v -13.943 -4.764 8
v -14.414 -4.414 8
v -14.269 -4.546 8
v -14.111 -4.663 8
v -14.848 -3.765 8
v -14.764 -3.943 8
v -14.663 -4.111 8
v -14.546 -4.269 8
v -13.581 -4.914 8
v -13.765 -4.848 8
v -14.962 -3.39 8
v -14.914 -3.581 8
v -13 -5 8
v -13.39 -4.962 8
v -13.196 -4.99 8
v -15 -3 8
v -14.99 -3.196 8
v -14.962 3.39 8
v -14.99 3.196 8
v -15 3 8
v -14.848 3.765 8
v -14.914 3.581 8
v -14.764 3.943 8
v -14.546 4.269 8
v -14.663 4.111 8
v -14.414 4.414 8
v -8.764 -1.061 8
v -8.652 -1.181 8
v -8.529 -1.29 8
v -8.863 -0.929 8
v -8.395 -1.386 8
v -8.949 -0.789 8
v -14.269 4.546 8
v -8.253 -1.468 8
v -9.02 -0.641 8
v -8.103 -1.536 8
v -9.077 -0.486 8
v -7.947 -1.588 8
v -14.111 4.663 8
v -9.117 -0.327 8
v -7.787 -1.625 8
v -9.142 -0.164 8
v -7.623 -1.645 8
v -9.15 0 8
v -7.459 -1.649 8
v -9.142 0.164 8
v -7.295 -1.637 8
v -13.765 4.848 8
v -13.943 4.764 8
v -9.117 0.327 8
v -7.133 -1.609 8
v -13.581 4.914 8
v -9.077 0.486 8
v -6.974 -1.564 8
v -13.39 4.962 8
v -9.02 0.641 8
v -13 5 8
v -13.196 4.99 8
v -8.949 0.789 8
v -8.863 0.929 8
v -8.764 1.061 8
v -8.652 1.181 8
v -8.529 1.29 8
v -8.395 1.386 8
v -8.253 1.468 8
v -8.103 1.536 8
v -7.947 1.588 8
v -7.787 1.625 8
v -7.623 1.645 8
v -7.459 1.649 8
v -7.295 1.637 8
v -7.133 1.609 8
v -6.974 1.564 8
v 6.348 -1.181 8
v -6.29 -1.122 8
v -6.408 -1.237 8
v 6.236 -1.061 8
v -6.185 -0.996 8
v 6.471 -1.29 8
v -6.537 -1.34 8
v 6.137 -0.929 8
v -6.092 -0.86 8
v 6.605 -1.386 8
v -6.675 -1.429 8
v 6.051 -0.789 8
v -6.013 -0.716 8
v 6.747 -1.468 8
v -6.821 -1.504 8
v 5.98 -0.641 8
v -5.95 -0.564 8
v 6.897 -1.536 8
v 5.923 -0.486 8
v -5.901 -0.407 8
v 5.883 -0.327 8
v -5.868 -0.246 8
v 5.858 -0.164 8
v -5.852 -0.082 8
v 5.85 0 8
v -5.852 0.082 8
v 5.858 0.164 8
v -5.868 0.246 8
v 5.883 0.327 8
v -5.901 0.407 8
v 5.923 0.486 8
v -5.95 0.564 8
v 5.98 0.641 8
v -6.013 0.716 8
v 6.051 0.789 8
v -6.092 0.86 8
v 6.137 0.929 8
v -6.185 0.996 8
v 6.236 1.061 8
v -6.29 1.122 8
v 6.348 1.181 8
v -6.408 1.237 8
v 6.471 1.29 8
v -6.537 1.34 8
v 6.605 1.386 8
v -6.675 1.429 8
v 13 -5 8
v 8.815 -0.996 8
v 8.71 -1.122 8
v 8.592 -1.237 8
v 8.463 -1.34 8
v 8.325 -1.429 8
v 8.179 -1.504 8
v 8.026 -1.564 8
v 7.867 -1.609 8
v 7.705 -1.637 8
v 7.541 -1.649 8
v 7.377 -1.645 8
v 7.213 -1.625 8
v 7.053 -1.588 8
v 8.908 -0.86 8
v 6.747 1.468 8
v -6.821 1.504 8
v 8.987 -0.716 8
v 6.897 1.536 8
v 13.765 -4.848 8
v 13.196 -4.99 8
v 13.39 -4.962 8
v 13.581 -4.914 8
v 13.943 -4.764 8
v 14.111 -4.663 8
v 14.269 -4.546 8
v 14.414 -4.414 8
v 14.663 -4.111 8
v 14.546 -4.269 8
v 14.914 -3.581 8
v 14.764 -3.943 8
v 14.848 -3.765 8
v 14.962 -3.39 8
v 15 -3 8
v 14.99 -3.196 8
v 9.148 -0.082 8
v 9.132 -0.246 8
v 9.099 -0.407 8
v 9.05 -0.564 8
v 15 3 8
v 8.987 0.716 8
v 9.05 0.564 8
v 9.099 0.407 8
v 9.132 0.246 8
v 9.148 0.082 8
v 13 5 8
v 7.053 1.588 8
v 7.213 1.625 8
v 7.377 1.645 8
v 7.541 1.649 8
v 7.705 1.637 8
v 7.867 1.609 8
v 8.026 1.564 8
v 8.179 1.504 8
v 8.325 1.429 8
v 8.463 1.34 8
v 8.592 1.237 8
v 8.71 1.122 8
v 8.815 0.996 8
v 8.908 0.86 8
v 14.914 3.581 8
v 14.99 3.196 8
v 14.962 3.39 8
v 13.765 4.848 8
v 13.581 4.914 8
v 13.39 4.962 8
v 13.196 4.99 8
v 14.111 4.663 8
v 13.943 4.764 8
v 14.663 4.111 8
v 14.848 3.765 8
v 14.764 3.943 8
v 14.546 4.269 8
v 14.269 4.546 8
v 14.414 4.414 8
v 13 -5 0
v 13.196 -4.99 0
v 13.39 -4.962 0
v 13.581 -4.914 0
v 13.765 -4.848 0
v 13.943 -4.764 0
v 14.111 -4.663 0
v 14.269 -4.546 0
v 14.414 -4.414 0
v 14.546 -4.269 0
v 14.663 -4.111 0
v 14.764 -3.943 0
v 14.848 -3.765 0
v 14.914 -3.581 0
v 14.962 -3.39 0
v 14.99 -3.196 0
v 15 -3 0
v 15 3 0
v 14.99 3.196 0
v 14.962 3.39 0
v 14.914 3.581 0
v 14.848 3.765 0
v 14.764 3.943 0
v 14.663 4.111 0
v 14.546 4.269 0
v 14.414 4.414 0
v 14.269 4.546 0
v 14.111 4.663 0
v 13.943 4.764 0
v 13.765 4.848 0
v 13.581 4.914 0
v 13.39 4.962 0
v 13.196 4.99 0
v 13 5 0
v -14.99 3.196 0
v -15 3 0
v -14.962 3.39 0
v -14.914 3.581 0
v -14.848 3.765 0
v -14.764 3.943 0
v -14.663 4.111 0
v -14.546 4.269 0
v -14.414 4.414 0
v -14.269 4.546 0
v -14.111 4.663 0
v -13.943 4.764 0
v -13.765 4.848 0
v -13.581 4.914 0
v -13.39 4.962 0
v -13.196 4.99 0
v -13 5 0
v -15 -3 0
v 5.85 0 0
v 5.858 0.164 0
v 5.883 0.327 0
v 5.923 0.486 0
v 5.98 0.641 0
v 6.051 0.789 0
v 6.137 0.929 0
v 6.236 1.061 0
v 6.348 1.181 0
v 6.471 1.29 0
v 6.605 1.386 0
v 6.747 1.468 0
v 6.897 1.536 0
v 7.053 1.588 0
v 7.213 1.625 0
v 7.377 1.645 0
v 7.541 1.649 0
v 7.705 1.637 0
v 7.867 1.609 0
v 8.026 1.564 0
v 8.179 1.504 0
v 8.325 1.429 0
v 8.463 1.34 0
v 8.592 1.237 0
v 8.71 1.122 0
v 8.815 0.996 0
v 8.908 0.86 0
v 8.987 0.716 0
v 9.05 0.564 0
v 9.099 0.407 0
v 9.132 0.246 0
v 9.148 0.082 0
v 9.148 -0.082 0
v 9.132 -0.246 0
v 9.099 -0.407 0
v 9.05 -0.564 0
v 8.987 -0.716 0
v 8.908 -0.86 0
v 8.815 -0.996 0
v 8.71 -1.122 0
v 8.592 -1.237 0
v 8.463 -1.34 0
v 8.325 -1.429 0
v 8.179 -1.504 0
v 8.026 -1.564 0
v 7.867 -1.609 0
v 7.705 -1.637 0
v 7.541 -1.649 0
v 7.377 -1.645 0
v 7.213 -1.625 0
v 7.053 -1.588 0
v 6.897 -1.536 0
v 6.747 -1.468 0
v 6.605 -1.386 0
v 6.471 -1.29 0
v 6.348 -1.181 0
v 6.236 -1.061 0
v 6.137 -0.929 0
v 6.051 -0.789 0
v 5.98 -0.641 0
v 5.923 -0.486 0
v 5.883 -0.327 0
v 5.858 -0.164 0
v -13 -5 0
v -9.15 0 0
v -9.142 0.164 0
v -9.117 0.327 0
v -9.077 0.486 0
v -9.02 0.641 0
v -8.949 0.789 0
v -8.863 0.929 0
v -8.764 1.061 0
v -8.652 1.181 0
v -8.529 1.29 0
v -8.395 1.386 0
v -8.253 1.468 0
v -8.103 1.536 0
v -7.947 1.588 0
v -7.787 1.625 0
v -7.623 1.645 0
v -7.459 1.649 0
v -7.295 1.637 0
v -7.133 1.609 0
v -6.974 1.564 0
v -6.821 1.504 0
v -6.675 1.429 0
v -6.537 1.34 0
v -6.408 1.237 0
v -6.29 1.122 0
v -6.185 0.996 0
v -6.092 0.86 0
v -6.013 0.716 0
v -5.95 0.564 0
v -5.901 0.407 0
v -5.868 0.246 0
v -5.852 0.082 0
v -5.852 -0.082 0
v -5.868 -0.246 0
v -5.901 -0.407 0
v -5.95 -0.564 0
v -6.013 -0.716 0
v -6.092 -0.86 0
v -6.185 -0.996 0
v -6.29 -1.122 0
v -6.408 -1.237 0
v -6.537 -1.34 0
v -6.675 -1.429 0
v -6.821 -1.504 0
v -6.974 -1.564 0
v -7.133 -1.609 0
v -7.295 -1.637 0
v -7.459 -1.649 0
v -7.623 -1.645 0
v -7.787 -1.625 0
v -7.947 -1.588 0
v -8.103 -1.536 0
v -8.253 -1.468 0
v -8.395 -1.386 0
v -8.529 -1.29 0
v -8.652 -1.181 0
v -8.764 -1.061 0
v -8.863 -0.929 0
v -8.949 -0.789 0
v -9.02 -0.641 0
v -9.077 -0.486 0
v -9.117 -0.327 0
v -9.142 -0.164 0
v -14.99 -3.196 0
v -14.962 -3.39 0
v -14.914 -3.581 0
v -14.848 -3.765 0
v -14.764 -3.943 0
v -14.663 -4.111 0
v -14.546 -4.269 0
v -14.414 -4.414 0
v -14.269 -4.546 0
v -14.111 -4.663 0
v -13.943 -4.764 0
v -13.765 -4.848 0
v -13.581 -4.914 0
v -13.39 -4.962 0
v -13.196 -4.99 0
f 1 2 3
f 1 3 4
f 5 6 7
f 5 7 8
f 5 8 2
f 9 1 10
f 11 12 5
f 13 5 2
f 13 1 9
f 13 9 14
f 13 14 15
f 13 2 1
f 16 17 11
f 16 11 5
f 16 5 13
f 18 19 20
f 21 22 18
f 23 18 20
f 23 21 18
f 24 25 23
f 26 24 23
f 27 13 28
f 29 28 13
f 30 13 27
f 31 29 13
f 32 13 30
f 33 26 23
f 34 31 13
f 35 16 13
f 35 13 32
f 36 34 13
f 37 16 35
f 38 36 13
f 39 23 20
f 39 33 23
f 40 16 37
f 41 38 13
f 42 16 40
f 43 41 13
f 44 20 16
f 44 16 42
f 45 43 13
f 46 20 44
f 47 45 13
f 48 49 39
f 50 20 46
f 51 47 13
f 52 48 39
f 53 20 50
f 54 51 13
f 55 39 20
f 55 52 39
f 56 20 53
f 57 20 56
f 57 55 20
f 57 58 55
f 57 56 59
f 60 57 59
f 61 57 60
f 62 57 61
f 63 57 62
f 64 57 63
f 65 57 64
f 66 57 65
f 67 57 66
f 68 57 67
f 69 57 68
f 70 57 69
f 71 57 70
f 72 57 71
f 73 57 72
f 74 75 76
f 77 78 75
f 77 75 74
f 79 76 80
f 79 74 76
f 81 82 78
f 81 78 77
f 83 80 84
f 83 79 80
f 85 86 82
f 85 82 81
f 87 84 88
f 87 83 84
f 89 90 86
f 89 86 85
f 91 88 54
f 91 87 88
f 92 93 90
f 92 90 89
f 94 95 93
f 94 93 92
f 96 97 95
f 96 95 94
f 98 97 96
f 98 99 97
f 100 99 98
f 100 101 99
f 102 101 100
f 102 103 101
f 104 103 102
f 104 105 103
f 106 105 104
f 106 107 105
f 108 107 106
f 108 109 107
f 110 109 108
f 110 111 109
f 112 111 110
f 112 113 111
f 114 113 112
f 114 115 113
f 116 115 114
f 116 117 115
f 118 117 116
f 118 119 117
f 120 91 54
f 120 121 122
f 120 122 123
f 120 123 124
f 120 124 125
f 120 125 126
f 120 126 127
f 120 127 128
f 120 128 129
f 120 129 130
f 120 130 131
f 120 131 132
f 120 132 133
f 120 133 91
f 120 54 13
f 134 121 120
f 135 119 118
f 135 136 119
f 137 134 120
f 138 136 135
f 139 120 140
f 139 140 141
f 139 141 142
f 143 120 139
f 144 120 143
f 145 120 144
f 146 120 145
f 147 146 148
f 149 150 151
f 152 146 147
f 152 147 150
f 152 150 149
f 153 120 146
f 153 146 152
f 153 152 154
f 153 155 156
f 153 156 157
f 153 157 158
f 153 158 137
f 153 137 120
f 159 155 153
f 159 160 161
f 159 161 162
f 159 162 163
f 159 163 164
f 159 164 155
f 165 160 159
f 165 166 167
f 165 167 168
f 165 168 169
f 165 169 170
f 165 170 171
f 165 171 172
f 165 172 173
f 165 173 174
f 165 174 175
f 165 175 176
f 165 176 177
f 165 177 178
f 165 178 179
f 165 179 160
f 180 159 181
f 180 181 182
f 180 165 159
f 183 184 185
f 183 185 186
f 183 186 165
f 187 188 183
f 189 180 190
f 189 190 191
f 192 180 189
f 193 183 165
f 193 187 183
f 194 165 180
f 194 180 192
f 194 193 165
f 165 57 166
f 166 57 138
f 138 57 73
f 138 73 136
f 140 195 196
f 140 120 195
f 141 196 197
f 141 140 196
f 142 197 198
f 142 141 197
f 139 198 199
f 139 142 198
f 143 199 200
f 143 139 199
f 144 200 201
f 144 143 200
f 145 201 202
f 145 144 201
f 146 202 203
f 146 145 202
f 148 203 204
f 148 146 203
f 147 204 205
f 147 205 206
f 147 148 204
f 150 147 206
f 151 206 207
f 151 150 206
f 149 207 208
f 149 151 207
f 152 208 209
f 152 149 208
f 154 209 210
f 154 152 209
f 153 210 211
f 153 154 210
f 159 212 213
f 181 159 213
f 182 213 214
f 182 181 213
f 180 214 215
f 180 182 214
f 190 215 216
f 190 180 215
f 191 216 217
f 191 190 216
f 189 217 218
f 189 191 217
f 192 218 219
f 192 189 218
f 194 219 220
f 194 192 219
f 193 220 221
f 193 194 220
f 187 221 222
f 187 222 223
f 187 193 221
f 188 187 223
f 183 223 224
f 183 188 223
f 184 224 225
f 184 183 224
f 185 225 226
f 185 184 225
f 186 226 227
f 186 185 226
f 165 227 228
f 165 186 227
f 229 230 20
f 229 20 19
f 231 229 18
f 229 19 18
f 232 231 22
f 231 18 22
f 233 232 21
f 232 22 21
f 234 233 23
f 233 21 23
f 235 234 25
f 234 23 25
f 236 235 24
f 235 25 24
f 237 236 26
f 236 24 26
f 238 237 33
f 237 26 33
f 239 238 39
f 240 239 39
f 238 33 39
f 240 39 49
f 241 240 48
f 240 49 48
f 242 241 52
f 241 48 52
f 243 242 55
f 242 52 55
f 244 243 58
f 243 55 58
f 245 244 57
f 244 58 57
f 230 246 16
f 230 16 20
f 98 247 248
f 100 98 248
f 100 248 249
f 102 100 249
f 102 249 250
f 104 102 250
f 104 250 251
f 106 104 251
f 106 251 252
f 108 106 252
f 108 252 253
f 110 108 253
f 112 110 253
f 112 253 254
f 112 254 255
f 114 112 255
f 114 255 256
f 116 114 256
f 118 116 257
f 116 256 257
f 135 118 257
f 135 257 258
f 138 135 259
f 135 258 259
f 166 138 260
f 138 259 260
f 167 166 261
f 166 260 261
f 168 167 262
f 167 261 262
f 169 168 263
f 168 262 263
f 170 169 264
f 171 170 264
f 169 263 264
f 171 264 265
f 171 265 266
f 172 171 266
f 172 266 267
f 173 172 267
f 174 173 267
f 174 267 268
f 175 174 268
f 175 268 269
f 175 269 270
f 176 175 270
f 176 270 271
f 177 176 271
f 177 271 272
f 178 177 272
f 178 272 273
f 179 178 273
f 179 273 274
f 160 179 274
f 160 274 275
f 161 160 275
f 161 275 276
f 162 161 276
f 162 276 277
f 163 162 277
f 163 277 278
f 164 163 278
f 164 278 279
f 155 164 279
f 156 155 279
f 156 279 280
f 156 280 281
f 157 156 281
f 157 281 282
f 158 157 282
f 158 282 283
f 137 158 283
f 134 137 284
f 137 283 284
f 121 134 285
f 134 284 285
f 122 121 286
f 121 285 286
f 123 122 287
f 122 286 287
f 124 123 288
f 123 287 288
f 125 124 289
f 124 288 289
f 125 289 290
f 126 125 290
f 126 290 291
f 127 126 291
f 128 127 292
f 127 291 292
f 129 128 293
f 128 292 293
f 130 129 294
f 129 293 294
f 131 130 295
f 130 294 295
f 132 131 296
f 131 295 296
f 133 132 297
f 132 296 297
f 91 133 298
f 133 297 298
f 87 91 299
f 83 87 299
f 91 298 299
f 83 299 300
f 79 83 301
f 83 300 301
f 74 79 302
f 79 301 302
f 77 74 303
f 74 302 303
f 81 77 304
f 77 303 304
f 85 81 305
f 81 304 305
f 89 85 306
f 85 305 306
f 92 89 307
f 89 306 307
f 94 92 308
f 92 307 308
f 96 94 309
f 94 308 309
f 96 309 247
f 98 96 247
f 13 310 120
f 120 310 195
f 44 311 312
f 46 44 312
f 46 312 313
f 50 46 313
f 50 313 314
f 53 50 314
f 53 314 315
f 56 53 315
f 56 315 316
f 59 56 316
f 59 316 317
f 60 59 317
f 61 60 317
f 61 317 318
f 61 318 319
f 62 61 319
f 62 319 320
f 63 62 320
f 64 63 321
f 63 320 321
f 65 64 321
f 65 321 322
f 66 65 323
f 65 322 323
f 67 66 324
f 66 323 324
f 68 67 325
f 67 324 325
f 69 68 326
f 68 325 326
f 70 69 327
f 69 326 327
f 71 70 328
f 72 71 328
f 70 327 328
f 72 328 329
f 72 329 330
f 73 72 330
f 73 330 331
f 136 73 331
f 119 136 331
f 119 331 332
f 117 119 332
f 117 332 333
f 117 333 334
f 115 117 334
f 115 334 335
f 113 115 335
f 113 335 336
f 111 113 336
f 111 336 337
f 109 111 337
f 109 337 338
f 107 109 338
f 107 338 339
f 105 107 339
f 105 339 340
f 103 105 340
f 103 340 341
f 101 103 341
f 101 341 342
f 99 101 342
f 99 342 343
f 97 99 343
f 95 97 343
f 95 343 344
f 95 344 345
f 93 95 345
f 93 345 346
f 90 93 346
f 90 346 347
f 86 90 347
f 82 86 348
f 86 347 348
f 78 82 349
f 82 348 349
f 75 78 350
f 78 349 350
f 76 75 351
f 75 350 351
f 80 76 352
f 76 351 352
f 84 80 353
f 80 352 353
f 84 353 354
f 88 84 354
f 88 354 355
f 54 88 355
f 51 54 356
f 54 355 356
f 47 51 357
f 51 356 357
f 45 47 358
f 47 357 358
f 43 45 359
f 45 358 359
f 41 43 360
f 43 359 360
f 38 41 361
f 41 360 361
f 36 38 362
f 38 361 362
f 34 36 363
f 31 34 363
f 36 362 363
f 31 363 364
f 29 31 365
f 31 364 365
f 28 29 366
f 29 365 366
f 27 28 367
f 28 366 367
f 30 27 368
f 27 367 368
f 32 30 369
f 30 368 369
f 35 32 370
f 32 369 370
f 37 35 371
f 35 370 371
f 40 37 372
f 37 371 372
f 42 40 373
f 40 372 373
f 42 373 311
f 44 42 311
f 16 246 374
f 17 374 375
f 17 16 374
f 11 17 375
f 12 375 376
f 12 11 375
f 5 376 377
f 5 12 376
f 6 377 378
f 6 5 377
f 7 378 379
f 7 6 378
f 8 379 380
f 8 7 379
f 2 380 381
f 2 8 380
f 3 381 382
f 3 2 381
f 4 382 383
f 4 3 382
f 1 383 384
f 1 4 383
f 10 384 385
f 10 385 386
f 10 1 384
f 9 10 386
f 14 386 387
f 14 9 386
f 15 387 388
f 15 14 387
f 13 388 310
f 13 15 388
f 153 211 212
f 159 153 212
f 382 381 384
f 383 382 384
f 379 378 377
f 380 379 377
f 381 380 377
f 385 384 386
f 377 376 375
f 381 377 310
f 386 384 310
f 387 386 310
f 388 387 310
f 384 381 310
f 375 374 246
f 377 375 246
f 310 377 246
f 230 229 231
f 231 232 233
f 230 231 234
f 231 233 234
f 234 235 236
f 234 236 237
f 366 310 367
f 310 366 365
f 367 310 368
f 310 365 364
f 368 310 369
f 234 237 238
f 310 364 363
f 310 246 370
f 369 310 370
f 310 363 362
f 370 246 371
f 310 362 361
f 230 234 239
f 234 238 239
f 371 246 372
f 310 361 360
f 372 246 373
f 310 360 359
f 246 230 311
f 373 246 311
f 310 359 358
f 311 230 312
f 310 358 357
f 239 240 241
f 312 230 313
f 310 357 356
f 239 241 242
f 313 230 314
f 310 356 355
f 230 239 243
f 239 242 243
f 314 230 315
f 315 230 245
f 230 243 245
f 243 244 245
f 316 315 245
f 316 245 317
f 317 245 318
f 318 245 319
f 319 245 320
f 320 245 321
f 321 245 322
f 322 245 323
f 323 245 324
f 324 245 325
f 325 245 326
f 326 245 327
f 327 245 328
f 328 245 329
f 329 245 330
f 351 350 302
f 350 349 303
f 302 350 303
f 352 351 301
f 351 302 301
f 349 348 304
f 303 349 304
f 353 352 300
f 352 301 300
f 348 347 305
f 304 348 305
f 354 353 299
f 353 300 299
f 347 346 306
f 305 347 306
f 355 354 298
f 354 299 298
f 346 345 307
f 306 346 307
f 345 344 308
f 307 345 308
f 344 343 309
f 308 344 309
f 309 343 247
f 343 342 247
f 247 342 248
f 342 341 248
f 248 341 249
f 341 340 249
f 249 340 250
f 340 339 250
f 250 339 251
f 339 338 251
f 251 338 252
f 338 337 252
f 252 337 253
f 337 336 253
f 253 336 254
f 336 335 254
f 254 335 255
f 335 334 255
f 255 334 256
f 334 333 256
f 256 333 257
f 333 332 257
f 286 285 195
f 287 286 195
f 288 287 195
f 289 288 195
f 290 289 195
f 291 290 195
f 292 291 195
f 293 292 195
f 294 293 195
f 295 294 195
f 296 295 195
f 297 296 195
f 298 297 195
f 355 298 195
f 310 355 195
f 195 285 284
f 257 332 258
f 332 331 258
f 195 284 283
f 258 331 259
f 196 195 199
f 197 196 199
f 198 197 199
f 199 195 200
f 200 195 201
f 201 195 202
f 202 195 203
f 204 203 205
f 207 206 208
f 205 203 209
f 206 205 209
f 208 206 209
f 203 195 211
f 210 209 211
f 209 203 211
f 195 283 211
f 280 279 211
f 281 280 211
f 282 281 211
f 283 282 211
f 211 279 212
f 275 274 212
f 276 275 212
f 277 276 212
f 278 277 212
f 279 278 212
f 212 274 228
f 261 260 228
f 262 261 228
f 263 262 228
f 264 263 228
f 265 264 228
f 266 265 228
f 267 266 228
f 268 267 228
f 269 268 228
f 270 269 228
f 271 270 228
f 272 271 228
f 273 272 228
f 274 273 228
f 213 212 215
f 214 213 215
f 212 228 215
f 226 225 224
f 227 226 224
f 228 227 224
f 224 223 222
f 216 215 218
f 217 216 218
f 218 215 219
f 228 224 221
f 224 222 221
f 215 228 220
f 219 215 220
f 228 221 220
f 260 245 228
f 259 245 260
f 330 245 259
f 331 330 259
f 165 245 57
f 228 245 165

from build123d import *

# Parameters (mm, degrees)
SKETCH_1_W          = 30
SKETCH_1_H          = 10
EXTRUDE_1_DEPTH     = 8
FILLET_1_R          = 2
SKETCH_3_R          = 1.65
CUT_EXTRUDE_1_DEPTH = 9


with BuildPart() as part:
    # 草图1 → 凸台-拉伸1 (new body)
    with BuildSketch(Plane.XY):
        Rectangle(SKETCH_1_W, SKETCH_1_H)
    extrude(amount=EXTRUDE_1_DEPTH)

    # 圆角1
    fillet_1_edges = [part.edges().sort_by_distance(p)[0] for p in [
        (15, -5, 4),
        (-15, -5, 4),
        (-15, 5, 4),
        (15, 5, 4),
    ]]
    fillet(fillet_1_edges, radius=FILLET_1_R)

    # 草图3 → 切除-拉伸1 (cut, through all)
    with BuildSketch(Plane(origin=(0, 0, 0), x_dir=(-1, 0, 0), z_dir=(0, 0, -1))):
        with Locations((-7.5, 0)):
            Circle(SKETCH_3_R)
        with Locations((7.5, 0)):
            Circle(SKETCH_3_R)
    extrude(amount=-CUT_EXTRUDE_1_DEPTH, mode=Mode.SUBTRACT)


solid = part.part
